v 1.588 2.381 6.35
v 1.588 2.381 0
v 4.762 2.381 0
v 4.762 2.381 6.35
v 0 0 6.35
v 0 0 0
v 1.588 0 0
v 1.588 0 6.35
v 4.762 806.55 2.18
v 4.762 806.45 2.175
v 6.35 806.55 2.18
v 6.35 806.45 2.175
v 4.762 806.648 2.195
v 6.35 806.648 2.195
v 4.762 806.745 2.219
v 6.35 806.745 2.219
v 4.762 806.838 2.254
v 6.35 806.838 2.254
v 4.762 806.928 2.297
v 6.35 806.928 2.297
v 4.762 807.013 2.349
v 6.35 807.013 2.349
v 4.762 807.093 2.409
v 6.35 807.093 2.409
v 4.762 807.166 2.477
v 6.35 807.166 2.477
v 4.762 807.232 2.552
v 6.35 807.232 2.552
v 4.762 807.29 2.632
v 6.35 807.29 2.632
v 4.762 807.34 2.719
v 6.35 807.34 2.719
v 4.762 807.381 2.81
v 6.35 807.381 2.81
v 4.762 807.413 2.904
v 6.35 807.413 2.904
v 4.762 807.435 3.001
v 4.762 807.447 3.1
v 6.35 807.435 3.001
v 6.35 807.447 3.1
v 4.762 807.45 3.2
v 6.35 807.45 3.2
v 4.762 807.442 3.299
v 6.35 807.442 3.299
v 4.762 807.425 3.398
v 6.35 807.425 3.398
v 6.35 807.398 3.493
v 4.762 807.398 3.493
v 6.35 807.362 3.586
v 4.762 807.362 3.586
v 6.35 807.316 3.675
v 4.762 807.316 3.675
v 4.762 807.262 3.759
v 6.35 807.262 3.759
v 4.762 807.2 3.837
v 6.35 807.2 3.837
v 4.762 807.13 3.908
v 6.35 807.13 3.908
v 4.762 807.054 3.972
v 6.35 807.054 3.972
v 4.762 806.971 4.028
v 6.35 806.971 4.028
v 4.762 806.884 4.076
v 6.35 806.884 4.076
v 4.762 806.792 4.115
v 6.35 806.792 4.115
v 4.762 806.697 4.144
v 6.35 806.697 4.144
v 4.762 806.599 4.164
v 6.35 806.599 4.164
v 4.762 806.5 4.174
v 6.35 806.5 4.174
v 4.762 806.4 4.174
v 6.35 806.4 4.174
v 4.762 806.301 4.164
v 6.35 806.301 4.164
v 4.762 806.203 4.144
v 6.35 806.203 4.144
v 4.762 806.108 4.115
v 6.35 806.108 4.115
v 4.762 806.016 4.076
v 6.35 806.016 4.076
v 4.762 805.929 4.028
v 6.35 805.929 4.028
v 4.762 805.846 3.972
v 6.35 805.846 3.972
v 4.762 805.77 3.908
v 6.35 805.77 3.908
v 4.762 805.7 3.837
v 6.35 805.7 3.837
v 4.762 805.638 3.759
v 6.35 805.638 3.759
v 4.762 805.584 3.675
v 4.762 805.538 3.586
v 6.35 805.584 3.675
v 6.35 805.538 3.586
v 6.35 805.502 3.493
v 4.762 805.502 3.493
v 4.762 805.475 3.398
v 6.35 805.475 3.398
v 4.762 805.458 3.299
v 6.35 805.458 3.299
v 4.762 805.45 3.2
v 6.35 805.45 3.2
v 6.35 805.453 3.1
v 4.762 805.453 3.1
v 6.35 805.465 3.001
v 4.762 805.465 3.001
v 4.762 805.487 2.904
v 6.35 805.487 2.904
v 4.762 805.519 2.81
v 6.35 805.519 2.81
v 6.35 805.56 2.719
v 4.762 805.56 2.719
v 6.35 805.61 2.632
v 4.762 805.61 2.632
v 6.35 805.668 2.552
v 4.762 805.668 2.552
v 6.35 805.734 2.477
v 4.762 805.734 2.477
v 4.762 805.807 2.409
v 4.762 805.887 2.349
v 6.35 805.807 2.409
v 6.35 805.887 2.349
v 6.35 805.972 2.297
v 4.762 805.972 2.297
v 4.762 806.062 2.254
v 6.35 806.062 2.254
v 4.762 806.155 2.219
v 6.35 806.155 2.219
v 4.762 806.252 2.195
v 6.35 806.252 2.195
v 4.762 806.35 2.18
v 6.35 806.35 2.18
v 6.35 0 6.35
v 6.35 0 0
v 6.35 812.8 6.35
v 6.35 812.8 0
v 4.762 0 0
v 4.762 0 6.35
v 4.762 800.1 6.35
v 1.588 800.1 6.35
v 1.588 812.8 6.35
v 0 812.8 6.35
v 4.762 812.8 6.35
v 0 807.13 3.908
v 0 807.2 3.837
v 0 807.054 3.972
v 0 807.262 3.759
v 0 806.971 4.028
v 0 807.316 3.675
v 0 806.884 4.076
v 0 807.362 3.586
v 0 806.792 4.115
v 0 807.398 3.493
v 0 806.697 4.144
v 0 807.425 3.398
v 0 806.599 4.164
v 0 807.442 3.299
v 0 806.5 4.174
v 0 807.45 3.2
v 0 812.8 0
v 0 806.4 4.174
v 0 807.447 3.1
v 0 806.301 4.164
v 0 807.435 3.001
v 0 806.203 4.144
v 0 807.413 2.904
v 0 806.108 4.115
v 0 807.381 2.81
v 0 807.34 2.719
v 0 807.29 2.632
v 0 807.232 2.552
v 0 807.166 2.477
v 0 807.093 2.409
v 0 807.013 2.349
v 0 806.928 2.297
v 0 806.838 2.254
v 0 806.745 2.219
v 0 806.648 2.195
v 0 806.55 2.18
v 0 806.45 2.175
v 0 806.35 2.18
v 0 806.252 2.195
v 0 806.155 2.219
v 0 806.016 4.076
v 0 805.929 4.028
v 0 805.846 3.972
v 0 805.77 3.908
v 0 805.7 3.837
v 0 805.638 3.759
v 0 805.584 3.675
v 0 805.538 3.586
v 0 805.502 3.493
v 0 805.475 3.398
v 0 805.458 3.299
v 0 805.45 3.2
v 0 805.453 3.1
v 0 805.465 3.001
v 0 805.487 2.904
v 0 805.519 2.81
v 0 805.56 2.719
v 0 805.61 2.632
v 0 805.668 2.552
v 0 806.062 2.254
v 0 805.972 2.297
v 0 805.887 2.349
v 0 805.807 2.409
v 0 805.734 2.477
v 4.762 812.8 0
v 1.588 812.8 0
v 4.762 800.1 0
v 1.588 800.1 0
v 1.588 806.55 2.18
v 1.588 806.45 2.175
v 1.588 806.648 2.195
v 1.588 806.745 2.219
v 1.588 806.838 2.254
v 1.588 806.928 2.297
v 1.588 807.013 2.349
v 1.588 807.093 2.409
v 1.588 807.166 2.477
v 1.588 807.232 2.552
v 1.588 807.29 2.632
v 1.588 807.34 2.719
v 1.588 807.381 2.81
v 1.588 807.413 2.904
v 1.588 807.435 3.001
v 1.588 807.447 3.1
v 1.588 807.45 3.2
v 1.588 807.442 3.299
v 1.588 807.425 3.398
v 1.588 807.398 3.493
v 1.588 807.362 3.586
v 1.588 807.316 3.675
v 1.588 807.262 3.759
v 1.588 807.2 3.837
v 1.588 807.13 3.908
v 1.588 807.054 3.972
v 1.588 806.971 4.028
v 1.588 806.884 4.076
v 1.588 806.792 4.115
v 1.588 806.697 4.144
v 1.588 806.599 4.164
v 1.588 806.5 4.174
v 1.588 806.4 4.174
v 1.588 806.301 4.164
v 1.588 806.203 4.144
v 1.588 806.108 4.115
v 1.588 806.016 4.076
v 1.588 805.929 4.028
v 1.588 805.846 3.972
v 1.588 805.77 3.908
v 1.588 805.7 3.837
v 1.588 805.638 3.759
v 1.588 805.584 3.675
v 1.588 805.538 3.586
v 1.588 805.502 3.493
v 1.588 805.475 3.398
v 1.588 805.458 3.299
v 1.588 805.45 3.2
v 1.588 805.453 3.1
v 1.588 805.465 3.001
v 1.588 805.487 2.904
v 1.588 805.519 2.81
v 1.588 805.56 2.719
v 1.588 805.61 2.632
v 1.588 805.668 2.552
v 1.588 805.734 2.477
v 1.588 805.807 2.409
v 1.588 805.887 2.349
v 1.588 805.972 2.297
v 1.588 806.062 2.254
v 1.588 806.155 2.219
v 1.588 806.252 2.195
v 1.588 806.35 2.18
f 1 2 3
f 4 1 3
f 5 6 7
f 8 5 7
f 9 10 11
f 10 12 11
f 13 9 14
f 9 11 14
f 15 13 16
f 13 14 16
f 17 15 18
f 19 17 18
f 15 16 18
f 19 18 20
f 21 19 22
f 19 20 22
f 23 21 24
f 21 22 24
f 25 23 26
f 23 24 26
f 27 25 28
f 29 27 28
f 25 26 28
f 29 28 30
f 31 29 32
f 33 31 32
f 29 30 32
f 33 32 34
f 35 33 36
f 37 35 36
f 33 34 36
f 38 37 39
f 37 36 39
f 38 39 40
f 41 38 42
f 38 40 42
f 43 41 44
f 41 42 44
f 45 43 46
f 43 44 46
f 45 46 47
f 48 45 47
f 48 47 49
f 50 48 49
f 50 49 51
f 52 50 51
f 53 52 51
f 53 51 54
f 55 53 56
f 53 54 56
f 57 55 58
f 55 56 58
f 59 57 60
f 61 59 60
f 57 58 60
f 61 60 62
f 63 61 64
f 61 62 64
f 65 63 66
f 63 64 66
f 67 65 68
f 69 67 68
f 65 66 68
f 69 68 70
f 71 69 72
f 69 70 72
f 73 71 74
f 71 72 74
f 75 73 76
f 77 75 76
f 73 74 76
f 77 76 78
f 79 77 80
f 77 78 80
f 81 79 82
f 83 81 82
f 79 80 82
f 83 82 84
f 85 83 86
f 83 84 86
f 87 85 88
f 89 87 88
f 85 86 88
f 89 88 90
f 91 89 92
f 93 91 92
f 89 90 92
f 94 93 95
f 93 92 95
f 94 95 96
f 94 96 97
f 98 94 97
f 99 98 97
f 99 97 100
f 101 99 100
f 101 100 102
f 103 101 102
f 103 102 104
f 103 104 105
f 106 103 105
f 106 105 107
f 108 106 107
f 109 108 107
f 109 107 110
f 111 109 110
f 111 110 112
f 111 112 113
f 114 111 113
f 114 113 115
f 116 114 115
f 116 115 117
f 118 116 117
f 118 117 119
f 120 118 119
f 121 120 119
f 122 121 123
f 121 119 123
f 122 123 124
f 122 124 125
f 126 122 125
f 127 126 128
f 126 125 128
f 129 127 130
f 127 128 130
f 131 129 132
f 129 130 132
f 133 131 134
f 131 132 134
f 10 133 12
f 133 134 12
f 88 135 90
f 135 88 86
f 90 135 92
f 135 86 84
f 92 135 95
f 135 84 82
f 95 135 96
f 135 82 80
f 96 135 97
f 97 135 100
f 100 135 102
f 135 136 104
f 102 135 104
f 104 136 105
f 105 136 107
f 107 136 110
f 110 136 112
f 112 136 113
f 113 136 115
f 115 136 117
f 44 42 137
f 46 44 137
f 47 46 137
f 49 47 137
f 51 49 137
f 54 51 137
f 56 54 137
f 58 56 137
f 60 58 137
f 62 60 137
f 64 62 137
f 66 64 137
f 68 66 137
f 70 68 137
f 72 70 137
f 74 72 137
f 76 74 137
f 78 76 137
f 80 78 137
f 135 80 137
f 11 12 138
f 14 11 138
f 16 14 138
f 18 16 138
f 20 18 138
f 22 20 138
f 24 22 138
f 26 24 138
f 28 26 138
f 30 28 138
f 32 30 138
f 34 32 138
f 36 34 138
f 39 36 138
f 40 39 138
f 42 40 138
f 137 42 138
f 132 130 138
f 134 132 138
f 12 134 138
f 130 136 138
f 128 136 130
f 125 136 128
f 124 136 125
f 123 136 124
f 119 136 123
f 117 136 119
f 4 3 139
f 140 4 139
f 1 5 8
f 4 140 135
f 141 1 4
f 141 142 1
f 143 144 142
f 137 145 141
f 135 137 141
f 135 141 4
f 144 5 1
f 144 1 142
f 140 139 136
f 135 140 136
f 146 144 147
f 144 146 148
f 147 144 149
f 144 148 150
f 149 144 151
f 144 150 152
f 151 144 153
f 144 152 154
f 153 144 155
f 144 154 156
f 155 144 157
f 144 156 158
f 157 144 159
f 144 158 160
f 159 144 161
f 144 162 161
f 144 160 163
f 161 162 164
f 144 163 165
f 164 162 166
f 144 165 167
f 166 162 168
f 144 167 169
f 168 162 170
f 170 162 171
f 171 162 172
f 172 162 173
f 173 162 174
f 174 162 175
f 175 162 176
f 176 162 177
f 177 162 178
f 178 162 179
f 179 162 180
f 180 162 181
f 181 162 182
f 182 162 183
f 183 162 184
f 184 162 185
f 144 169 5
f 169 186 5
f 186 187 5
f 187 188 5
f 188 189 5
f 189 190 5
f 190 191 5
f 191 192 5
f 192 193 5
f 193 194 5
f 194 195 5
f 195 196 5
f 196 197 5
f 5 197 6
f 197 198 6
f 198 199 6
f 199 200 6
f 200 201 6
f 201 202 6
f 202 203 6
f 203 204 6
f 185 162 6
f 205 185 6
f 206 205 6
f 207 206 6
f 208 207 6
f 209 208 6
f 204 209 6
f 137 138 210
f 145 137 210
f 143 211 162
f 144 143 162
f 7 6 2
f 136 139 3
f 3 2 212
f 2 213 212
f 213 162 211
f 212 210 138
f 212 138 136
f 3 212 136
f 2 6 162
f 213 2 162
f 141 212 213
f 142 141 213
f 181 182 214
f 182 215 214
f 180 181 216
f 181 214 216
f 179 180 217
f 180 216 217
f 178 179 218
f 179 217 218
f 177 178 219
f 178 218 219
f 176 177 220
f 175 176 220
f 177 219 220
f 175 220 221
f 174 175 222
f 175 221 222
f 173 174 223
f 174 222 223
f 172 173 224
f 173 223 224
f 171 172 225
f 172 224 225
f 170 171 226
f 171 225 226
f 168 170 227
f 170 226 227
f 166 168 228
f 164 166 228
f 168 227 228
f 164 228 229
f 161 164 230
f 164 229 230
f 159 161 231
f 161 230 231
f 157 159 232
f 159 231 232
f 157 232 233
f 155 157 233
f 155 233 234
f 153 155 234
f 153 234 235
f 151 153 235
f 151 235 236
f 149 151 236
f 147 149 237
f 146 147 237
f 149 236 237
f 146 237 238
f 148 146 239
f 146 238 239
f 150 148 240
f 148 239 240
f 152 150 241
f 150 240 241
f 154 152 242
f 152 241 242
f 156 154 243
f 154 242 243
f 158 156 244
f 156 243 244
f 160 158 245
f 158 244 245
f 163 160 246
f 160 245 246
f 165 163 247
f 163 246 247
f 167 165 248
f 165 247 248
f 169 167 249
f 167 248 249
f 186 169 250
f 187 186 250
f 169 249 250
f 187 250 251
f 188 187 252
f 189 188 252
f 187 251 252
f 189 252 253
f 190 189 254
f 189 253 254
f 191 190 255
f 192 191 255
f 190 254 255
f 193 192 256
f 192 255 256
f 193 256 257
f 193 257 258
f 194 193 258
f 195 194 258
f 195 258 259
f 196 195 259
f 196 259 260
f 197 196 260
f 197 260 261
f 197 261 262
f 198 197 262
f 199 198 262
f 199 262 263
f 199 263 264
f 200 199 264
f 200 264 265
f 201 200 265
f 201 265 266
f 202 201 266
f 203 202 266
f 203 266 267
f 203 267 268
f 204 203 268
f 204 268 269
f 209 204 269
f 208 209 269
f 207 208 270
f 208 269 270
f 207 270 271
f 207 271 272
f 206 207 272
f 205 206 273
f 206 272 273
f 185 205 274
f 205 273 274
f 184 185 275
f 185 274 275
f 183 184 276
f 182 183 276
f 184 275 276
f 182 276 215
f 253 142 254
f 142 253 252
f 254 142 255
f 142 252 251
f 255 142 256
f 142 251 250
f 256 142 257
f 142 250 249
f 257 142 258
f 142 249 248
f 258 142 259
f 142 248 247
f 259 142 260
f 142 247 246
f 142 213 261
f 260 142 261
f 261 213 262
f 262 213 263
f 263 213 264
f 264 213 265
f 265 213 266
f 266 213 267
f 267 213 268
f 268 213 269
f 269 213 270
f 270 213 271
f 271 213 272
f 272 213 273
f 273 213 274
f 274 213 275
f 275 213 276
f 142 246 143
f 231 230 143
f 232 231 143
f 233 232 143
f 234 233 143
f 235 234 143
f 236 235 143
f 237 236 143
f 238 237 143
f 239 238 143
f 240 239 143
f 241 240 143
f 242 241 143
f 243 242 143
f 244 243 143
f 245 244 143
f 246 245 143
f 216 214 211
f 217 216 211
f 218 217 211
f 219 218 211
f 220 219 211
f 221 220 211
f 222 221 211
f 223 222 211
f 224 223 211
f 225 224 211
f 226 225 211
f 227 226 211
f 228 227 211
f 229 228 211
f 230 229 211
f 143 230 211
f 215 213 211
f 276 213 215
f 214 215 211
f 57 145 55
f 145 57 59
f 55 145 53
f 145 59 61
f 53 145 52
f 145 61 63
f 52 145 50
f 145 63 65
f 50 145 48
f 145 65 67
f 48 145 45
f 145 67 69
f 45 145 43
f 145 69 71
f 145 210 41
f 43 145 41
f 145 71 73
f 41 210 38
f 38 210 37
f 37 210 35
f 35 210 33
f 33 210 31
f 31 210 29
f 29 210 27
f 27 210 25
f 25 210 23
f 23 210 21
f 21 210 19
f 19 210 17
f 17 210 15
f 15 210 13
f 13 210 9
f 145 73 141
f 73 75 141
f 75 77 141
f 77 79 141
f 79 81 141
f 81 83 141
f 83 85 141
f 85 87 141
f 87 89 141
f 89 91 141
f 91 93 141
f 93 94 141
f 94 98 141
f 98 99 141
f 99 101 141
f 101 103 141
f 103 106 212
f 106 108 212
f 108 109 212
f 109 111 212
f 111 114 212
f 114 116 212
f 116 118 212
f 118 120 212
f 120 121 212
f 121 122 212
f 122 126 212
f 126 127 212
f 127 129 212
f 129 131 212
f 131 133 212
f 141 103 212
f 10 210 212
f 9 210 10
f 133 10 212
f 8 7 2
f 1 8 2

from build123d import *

# Parameters (mm, degrees)
BOSS_EXTRUDE1_DEPTH = 6.35
SKETCH3_R           = 1
CUT_EXTRUDE3_DEPTH  = 10


with BuildPart() as part:
    # Sketch1 → Boss-Extrude1 (new body)
    with BuildSketch(Plane.XY):
        Polygon((0, 0), (1.5875, 0), (1.5875, 2.38125), (4.7625, 2.38125), (4.7625, 0), (6.35, 0), (6.35, 812.8), (4.7625, 812.8), (4.7625, 800.1), (1.5875, 800.1), (1.5875, 812.8), (0, 812.8), align=None)
    extrude(amount=BOSS_EXTRUDE1_DEPTH)

    # Sketch3 → Cut-Extrude3 (cut, symmetric)
    with BuildSketch(Plane(origin=(0, 0, 0), x_dir=(0, 0, -1), z_dir=(1, 0, 0))):
        with Locations((-3.175, 806.45)):
            Circle(SKETCH3_R)
    extrude(amount=CUT_EXTRUDE3_DEPTH, both=True, mode=Mode.SUBTRACT)


solid = part.part
